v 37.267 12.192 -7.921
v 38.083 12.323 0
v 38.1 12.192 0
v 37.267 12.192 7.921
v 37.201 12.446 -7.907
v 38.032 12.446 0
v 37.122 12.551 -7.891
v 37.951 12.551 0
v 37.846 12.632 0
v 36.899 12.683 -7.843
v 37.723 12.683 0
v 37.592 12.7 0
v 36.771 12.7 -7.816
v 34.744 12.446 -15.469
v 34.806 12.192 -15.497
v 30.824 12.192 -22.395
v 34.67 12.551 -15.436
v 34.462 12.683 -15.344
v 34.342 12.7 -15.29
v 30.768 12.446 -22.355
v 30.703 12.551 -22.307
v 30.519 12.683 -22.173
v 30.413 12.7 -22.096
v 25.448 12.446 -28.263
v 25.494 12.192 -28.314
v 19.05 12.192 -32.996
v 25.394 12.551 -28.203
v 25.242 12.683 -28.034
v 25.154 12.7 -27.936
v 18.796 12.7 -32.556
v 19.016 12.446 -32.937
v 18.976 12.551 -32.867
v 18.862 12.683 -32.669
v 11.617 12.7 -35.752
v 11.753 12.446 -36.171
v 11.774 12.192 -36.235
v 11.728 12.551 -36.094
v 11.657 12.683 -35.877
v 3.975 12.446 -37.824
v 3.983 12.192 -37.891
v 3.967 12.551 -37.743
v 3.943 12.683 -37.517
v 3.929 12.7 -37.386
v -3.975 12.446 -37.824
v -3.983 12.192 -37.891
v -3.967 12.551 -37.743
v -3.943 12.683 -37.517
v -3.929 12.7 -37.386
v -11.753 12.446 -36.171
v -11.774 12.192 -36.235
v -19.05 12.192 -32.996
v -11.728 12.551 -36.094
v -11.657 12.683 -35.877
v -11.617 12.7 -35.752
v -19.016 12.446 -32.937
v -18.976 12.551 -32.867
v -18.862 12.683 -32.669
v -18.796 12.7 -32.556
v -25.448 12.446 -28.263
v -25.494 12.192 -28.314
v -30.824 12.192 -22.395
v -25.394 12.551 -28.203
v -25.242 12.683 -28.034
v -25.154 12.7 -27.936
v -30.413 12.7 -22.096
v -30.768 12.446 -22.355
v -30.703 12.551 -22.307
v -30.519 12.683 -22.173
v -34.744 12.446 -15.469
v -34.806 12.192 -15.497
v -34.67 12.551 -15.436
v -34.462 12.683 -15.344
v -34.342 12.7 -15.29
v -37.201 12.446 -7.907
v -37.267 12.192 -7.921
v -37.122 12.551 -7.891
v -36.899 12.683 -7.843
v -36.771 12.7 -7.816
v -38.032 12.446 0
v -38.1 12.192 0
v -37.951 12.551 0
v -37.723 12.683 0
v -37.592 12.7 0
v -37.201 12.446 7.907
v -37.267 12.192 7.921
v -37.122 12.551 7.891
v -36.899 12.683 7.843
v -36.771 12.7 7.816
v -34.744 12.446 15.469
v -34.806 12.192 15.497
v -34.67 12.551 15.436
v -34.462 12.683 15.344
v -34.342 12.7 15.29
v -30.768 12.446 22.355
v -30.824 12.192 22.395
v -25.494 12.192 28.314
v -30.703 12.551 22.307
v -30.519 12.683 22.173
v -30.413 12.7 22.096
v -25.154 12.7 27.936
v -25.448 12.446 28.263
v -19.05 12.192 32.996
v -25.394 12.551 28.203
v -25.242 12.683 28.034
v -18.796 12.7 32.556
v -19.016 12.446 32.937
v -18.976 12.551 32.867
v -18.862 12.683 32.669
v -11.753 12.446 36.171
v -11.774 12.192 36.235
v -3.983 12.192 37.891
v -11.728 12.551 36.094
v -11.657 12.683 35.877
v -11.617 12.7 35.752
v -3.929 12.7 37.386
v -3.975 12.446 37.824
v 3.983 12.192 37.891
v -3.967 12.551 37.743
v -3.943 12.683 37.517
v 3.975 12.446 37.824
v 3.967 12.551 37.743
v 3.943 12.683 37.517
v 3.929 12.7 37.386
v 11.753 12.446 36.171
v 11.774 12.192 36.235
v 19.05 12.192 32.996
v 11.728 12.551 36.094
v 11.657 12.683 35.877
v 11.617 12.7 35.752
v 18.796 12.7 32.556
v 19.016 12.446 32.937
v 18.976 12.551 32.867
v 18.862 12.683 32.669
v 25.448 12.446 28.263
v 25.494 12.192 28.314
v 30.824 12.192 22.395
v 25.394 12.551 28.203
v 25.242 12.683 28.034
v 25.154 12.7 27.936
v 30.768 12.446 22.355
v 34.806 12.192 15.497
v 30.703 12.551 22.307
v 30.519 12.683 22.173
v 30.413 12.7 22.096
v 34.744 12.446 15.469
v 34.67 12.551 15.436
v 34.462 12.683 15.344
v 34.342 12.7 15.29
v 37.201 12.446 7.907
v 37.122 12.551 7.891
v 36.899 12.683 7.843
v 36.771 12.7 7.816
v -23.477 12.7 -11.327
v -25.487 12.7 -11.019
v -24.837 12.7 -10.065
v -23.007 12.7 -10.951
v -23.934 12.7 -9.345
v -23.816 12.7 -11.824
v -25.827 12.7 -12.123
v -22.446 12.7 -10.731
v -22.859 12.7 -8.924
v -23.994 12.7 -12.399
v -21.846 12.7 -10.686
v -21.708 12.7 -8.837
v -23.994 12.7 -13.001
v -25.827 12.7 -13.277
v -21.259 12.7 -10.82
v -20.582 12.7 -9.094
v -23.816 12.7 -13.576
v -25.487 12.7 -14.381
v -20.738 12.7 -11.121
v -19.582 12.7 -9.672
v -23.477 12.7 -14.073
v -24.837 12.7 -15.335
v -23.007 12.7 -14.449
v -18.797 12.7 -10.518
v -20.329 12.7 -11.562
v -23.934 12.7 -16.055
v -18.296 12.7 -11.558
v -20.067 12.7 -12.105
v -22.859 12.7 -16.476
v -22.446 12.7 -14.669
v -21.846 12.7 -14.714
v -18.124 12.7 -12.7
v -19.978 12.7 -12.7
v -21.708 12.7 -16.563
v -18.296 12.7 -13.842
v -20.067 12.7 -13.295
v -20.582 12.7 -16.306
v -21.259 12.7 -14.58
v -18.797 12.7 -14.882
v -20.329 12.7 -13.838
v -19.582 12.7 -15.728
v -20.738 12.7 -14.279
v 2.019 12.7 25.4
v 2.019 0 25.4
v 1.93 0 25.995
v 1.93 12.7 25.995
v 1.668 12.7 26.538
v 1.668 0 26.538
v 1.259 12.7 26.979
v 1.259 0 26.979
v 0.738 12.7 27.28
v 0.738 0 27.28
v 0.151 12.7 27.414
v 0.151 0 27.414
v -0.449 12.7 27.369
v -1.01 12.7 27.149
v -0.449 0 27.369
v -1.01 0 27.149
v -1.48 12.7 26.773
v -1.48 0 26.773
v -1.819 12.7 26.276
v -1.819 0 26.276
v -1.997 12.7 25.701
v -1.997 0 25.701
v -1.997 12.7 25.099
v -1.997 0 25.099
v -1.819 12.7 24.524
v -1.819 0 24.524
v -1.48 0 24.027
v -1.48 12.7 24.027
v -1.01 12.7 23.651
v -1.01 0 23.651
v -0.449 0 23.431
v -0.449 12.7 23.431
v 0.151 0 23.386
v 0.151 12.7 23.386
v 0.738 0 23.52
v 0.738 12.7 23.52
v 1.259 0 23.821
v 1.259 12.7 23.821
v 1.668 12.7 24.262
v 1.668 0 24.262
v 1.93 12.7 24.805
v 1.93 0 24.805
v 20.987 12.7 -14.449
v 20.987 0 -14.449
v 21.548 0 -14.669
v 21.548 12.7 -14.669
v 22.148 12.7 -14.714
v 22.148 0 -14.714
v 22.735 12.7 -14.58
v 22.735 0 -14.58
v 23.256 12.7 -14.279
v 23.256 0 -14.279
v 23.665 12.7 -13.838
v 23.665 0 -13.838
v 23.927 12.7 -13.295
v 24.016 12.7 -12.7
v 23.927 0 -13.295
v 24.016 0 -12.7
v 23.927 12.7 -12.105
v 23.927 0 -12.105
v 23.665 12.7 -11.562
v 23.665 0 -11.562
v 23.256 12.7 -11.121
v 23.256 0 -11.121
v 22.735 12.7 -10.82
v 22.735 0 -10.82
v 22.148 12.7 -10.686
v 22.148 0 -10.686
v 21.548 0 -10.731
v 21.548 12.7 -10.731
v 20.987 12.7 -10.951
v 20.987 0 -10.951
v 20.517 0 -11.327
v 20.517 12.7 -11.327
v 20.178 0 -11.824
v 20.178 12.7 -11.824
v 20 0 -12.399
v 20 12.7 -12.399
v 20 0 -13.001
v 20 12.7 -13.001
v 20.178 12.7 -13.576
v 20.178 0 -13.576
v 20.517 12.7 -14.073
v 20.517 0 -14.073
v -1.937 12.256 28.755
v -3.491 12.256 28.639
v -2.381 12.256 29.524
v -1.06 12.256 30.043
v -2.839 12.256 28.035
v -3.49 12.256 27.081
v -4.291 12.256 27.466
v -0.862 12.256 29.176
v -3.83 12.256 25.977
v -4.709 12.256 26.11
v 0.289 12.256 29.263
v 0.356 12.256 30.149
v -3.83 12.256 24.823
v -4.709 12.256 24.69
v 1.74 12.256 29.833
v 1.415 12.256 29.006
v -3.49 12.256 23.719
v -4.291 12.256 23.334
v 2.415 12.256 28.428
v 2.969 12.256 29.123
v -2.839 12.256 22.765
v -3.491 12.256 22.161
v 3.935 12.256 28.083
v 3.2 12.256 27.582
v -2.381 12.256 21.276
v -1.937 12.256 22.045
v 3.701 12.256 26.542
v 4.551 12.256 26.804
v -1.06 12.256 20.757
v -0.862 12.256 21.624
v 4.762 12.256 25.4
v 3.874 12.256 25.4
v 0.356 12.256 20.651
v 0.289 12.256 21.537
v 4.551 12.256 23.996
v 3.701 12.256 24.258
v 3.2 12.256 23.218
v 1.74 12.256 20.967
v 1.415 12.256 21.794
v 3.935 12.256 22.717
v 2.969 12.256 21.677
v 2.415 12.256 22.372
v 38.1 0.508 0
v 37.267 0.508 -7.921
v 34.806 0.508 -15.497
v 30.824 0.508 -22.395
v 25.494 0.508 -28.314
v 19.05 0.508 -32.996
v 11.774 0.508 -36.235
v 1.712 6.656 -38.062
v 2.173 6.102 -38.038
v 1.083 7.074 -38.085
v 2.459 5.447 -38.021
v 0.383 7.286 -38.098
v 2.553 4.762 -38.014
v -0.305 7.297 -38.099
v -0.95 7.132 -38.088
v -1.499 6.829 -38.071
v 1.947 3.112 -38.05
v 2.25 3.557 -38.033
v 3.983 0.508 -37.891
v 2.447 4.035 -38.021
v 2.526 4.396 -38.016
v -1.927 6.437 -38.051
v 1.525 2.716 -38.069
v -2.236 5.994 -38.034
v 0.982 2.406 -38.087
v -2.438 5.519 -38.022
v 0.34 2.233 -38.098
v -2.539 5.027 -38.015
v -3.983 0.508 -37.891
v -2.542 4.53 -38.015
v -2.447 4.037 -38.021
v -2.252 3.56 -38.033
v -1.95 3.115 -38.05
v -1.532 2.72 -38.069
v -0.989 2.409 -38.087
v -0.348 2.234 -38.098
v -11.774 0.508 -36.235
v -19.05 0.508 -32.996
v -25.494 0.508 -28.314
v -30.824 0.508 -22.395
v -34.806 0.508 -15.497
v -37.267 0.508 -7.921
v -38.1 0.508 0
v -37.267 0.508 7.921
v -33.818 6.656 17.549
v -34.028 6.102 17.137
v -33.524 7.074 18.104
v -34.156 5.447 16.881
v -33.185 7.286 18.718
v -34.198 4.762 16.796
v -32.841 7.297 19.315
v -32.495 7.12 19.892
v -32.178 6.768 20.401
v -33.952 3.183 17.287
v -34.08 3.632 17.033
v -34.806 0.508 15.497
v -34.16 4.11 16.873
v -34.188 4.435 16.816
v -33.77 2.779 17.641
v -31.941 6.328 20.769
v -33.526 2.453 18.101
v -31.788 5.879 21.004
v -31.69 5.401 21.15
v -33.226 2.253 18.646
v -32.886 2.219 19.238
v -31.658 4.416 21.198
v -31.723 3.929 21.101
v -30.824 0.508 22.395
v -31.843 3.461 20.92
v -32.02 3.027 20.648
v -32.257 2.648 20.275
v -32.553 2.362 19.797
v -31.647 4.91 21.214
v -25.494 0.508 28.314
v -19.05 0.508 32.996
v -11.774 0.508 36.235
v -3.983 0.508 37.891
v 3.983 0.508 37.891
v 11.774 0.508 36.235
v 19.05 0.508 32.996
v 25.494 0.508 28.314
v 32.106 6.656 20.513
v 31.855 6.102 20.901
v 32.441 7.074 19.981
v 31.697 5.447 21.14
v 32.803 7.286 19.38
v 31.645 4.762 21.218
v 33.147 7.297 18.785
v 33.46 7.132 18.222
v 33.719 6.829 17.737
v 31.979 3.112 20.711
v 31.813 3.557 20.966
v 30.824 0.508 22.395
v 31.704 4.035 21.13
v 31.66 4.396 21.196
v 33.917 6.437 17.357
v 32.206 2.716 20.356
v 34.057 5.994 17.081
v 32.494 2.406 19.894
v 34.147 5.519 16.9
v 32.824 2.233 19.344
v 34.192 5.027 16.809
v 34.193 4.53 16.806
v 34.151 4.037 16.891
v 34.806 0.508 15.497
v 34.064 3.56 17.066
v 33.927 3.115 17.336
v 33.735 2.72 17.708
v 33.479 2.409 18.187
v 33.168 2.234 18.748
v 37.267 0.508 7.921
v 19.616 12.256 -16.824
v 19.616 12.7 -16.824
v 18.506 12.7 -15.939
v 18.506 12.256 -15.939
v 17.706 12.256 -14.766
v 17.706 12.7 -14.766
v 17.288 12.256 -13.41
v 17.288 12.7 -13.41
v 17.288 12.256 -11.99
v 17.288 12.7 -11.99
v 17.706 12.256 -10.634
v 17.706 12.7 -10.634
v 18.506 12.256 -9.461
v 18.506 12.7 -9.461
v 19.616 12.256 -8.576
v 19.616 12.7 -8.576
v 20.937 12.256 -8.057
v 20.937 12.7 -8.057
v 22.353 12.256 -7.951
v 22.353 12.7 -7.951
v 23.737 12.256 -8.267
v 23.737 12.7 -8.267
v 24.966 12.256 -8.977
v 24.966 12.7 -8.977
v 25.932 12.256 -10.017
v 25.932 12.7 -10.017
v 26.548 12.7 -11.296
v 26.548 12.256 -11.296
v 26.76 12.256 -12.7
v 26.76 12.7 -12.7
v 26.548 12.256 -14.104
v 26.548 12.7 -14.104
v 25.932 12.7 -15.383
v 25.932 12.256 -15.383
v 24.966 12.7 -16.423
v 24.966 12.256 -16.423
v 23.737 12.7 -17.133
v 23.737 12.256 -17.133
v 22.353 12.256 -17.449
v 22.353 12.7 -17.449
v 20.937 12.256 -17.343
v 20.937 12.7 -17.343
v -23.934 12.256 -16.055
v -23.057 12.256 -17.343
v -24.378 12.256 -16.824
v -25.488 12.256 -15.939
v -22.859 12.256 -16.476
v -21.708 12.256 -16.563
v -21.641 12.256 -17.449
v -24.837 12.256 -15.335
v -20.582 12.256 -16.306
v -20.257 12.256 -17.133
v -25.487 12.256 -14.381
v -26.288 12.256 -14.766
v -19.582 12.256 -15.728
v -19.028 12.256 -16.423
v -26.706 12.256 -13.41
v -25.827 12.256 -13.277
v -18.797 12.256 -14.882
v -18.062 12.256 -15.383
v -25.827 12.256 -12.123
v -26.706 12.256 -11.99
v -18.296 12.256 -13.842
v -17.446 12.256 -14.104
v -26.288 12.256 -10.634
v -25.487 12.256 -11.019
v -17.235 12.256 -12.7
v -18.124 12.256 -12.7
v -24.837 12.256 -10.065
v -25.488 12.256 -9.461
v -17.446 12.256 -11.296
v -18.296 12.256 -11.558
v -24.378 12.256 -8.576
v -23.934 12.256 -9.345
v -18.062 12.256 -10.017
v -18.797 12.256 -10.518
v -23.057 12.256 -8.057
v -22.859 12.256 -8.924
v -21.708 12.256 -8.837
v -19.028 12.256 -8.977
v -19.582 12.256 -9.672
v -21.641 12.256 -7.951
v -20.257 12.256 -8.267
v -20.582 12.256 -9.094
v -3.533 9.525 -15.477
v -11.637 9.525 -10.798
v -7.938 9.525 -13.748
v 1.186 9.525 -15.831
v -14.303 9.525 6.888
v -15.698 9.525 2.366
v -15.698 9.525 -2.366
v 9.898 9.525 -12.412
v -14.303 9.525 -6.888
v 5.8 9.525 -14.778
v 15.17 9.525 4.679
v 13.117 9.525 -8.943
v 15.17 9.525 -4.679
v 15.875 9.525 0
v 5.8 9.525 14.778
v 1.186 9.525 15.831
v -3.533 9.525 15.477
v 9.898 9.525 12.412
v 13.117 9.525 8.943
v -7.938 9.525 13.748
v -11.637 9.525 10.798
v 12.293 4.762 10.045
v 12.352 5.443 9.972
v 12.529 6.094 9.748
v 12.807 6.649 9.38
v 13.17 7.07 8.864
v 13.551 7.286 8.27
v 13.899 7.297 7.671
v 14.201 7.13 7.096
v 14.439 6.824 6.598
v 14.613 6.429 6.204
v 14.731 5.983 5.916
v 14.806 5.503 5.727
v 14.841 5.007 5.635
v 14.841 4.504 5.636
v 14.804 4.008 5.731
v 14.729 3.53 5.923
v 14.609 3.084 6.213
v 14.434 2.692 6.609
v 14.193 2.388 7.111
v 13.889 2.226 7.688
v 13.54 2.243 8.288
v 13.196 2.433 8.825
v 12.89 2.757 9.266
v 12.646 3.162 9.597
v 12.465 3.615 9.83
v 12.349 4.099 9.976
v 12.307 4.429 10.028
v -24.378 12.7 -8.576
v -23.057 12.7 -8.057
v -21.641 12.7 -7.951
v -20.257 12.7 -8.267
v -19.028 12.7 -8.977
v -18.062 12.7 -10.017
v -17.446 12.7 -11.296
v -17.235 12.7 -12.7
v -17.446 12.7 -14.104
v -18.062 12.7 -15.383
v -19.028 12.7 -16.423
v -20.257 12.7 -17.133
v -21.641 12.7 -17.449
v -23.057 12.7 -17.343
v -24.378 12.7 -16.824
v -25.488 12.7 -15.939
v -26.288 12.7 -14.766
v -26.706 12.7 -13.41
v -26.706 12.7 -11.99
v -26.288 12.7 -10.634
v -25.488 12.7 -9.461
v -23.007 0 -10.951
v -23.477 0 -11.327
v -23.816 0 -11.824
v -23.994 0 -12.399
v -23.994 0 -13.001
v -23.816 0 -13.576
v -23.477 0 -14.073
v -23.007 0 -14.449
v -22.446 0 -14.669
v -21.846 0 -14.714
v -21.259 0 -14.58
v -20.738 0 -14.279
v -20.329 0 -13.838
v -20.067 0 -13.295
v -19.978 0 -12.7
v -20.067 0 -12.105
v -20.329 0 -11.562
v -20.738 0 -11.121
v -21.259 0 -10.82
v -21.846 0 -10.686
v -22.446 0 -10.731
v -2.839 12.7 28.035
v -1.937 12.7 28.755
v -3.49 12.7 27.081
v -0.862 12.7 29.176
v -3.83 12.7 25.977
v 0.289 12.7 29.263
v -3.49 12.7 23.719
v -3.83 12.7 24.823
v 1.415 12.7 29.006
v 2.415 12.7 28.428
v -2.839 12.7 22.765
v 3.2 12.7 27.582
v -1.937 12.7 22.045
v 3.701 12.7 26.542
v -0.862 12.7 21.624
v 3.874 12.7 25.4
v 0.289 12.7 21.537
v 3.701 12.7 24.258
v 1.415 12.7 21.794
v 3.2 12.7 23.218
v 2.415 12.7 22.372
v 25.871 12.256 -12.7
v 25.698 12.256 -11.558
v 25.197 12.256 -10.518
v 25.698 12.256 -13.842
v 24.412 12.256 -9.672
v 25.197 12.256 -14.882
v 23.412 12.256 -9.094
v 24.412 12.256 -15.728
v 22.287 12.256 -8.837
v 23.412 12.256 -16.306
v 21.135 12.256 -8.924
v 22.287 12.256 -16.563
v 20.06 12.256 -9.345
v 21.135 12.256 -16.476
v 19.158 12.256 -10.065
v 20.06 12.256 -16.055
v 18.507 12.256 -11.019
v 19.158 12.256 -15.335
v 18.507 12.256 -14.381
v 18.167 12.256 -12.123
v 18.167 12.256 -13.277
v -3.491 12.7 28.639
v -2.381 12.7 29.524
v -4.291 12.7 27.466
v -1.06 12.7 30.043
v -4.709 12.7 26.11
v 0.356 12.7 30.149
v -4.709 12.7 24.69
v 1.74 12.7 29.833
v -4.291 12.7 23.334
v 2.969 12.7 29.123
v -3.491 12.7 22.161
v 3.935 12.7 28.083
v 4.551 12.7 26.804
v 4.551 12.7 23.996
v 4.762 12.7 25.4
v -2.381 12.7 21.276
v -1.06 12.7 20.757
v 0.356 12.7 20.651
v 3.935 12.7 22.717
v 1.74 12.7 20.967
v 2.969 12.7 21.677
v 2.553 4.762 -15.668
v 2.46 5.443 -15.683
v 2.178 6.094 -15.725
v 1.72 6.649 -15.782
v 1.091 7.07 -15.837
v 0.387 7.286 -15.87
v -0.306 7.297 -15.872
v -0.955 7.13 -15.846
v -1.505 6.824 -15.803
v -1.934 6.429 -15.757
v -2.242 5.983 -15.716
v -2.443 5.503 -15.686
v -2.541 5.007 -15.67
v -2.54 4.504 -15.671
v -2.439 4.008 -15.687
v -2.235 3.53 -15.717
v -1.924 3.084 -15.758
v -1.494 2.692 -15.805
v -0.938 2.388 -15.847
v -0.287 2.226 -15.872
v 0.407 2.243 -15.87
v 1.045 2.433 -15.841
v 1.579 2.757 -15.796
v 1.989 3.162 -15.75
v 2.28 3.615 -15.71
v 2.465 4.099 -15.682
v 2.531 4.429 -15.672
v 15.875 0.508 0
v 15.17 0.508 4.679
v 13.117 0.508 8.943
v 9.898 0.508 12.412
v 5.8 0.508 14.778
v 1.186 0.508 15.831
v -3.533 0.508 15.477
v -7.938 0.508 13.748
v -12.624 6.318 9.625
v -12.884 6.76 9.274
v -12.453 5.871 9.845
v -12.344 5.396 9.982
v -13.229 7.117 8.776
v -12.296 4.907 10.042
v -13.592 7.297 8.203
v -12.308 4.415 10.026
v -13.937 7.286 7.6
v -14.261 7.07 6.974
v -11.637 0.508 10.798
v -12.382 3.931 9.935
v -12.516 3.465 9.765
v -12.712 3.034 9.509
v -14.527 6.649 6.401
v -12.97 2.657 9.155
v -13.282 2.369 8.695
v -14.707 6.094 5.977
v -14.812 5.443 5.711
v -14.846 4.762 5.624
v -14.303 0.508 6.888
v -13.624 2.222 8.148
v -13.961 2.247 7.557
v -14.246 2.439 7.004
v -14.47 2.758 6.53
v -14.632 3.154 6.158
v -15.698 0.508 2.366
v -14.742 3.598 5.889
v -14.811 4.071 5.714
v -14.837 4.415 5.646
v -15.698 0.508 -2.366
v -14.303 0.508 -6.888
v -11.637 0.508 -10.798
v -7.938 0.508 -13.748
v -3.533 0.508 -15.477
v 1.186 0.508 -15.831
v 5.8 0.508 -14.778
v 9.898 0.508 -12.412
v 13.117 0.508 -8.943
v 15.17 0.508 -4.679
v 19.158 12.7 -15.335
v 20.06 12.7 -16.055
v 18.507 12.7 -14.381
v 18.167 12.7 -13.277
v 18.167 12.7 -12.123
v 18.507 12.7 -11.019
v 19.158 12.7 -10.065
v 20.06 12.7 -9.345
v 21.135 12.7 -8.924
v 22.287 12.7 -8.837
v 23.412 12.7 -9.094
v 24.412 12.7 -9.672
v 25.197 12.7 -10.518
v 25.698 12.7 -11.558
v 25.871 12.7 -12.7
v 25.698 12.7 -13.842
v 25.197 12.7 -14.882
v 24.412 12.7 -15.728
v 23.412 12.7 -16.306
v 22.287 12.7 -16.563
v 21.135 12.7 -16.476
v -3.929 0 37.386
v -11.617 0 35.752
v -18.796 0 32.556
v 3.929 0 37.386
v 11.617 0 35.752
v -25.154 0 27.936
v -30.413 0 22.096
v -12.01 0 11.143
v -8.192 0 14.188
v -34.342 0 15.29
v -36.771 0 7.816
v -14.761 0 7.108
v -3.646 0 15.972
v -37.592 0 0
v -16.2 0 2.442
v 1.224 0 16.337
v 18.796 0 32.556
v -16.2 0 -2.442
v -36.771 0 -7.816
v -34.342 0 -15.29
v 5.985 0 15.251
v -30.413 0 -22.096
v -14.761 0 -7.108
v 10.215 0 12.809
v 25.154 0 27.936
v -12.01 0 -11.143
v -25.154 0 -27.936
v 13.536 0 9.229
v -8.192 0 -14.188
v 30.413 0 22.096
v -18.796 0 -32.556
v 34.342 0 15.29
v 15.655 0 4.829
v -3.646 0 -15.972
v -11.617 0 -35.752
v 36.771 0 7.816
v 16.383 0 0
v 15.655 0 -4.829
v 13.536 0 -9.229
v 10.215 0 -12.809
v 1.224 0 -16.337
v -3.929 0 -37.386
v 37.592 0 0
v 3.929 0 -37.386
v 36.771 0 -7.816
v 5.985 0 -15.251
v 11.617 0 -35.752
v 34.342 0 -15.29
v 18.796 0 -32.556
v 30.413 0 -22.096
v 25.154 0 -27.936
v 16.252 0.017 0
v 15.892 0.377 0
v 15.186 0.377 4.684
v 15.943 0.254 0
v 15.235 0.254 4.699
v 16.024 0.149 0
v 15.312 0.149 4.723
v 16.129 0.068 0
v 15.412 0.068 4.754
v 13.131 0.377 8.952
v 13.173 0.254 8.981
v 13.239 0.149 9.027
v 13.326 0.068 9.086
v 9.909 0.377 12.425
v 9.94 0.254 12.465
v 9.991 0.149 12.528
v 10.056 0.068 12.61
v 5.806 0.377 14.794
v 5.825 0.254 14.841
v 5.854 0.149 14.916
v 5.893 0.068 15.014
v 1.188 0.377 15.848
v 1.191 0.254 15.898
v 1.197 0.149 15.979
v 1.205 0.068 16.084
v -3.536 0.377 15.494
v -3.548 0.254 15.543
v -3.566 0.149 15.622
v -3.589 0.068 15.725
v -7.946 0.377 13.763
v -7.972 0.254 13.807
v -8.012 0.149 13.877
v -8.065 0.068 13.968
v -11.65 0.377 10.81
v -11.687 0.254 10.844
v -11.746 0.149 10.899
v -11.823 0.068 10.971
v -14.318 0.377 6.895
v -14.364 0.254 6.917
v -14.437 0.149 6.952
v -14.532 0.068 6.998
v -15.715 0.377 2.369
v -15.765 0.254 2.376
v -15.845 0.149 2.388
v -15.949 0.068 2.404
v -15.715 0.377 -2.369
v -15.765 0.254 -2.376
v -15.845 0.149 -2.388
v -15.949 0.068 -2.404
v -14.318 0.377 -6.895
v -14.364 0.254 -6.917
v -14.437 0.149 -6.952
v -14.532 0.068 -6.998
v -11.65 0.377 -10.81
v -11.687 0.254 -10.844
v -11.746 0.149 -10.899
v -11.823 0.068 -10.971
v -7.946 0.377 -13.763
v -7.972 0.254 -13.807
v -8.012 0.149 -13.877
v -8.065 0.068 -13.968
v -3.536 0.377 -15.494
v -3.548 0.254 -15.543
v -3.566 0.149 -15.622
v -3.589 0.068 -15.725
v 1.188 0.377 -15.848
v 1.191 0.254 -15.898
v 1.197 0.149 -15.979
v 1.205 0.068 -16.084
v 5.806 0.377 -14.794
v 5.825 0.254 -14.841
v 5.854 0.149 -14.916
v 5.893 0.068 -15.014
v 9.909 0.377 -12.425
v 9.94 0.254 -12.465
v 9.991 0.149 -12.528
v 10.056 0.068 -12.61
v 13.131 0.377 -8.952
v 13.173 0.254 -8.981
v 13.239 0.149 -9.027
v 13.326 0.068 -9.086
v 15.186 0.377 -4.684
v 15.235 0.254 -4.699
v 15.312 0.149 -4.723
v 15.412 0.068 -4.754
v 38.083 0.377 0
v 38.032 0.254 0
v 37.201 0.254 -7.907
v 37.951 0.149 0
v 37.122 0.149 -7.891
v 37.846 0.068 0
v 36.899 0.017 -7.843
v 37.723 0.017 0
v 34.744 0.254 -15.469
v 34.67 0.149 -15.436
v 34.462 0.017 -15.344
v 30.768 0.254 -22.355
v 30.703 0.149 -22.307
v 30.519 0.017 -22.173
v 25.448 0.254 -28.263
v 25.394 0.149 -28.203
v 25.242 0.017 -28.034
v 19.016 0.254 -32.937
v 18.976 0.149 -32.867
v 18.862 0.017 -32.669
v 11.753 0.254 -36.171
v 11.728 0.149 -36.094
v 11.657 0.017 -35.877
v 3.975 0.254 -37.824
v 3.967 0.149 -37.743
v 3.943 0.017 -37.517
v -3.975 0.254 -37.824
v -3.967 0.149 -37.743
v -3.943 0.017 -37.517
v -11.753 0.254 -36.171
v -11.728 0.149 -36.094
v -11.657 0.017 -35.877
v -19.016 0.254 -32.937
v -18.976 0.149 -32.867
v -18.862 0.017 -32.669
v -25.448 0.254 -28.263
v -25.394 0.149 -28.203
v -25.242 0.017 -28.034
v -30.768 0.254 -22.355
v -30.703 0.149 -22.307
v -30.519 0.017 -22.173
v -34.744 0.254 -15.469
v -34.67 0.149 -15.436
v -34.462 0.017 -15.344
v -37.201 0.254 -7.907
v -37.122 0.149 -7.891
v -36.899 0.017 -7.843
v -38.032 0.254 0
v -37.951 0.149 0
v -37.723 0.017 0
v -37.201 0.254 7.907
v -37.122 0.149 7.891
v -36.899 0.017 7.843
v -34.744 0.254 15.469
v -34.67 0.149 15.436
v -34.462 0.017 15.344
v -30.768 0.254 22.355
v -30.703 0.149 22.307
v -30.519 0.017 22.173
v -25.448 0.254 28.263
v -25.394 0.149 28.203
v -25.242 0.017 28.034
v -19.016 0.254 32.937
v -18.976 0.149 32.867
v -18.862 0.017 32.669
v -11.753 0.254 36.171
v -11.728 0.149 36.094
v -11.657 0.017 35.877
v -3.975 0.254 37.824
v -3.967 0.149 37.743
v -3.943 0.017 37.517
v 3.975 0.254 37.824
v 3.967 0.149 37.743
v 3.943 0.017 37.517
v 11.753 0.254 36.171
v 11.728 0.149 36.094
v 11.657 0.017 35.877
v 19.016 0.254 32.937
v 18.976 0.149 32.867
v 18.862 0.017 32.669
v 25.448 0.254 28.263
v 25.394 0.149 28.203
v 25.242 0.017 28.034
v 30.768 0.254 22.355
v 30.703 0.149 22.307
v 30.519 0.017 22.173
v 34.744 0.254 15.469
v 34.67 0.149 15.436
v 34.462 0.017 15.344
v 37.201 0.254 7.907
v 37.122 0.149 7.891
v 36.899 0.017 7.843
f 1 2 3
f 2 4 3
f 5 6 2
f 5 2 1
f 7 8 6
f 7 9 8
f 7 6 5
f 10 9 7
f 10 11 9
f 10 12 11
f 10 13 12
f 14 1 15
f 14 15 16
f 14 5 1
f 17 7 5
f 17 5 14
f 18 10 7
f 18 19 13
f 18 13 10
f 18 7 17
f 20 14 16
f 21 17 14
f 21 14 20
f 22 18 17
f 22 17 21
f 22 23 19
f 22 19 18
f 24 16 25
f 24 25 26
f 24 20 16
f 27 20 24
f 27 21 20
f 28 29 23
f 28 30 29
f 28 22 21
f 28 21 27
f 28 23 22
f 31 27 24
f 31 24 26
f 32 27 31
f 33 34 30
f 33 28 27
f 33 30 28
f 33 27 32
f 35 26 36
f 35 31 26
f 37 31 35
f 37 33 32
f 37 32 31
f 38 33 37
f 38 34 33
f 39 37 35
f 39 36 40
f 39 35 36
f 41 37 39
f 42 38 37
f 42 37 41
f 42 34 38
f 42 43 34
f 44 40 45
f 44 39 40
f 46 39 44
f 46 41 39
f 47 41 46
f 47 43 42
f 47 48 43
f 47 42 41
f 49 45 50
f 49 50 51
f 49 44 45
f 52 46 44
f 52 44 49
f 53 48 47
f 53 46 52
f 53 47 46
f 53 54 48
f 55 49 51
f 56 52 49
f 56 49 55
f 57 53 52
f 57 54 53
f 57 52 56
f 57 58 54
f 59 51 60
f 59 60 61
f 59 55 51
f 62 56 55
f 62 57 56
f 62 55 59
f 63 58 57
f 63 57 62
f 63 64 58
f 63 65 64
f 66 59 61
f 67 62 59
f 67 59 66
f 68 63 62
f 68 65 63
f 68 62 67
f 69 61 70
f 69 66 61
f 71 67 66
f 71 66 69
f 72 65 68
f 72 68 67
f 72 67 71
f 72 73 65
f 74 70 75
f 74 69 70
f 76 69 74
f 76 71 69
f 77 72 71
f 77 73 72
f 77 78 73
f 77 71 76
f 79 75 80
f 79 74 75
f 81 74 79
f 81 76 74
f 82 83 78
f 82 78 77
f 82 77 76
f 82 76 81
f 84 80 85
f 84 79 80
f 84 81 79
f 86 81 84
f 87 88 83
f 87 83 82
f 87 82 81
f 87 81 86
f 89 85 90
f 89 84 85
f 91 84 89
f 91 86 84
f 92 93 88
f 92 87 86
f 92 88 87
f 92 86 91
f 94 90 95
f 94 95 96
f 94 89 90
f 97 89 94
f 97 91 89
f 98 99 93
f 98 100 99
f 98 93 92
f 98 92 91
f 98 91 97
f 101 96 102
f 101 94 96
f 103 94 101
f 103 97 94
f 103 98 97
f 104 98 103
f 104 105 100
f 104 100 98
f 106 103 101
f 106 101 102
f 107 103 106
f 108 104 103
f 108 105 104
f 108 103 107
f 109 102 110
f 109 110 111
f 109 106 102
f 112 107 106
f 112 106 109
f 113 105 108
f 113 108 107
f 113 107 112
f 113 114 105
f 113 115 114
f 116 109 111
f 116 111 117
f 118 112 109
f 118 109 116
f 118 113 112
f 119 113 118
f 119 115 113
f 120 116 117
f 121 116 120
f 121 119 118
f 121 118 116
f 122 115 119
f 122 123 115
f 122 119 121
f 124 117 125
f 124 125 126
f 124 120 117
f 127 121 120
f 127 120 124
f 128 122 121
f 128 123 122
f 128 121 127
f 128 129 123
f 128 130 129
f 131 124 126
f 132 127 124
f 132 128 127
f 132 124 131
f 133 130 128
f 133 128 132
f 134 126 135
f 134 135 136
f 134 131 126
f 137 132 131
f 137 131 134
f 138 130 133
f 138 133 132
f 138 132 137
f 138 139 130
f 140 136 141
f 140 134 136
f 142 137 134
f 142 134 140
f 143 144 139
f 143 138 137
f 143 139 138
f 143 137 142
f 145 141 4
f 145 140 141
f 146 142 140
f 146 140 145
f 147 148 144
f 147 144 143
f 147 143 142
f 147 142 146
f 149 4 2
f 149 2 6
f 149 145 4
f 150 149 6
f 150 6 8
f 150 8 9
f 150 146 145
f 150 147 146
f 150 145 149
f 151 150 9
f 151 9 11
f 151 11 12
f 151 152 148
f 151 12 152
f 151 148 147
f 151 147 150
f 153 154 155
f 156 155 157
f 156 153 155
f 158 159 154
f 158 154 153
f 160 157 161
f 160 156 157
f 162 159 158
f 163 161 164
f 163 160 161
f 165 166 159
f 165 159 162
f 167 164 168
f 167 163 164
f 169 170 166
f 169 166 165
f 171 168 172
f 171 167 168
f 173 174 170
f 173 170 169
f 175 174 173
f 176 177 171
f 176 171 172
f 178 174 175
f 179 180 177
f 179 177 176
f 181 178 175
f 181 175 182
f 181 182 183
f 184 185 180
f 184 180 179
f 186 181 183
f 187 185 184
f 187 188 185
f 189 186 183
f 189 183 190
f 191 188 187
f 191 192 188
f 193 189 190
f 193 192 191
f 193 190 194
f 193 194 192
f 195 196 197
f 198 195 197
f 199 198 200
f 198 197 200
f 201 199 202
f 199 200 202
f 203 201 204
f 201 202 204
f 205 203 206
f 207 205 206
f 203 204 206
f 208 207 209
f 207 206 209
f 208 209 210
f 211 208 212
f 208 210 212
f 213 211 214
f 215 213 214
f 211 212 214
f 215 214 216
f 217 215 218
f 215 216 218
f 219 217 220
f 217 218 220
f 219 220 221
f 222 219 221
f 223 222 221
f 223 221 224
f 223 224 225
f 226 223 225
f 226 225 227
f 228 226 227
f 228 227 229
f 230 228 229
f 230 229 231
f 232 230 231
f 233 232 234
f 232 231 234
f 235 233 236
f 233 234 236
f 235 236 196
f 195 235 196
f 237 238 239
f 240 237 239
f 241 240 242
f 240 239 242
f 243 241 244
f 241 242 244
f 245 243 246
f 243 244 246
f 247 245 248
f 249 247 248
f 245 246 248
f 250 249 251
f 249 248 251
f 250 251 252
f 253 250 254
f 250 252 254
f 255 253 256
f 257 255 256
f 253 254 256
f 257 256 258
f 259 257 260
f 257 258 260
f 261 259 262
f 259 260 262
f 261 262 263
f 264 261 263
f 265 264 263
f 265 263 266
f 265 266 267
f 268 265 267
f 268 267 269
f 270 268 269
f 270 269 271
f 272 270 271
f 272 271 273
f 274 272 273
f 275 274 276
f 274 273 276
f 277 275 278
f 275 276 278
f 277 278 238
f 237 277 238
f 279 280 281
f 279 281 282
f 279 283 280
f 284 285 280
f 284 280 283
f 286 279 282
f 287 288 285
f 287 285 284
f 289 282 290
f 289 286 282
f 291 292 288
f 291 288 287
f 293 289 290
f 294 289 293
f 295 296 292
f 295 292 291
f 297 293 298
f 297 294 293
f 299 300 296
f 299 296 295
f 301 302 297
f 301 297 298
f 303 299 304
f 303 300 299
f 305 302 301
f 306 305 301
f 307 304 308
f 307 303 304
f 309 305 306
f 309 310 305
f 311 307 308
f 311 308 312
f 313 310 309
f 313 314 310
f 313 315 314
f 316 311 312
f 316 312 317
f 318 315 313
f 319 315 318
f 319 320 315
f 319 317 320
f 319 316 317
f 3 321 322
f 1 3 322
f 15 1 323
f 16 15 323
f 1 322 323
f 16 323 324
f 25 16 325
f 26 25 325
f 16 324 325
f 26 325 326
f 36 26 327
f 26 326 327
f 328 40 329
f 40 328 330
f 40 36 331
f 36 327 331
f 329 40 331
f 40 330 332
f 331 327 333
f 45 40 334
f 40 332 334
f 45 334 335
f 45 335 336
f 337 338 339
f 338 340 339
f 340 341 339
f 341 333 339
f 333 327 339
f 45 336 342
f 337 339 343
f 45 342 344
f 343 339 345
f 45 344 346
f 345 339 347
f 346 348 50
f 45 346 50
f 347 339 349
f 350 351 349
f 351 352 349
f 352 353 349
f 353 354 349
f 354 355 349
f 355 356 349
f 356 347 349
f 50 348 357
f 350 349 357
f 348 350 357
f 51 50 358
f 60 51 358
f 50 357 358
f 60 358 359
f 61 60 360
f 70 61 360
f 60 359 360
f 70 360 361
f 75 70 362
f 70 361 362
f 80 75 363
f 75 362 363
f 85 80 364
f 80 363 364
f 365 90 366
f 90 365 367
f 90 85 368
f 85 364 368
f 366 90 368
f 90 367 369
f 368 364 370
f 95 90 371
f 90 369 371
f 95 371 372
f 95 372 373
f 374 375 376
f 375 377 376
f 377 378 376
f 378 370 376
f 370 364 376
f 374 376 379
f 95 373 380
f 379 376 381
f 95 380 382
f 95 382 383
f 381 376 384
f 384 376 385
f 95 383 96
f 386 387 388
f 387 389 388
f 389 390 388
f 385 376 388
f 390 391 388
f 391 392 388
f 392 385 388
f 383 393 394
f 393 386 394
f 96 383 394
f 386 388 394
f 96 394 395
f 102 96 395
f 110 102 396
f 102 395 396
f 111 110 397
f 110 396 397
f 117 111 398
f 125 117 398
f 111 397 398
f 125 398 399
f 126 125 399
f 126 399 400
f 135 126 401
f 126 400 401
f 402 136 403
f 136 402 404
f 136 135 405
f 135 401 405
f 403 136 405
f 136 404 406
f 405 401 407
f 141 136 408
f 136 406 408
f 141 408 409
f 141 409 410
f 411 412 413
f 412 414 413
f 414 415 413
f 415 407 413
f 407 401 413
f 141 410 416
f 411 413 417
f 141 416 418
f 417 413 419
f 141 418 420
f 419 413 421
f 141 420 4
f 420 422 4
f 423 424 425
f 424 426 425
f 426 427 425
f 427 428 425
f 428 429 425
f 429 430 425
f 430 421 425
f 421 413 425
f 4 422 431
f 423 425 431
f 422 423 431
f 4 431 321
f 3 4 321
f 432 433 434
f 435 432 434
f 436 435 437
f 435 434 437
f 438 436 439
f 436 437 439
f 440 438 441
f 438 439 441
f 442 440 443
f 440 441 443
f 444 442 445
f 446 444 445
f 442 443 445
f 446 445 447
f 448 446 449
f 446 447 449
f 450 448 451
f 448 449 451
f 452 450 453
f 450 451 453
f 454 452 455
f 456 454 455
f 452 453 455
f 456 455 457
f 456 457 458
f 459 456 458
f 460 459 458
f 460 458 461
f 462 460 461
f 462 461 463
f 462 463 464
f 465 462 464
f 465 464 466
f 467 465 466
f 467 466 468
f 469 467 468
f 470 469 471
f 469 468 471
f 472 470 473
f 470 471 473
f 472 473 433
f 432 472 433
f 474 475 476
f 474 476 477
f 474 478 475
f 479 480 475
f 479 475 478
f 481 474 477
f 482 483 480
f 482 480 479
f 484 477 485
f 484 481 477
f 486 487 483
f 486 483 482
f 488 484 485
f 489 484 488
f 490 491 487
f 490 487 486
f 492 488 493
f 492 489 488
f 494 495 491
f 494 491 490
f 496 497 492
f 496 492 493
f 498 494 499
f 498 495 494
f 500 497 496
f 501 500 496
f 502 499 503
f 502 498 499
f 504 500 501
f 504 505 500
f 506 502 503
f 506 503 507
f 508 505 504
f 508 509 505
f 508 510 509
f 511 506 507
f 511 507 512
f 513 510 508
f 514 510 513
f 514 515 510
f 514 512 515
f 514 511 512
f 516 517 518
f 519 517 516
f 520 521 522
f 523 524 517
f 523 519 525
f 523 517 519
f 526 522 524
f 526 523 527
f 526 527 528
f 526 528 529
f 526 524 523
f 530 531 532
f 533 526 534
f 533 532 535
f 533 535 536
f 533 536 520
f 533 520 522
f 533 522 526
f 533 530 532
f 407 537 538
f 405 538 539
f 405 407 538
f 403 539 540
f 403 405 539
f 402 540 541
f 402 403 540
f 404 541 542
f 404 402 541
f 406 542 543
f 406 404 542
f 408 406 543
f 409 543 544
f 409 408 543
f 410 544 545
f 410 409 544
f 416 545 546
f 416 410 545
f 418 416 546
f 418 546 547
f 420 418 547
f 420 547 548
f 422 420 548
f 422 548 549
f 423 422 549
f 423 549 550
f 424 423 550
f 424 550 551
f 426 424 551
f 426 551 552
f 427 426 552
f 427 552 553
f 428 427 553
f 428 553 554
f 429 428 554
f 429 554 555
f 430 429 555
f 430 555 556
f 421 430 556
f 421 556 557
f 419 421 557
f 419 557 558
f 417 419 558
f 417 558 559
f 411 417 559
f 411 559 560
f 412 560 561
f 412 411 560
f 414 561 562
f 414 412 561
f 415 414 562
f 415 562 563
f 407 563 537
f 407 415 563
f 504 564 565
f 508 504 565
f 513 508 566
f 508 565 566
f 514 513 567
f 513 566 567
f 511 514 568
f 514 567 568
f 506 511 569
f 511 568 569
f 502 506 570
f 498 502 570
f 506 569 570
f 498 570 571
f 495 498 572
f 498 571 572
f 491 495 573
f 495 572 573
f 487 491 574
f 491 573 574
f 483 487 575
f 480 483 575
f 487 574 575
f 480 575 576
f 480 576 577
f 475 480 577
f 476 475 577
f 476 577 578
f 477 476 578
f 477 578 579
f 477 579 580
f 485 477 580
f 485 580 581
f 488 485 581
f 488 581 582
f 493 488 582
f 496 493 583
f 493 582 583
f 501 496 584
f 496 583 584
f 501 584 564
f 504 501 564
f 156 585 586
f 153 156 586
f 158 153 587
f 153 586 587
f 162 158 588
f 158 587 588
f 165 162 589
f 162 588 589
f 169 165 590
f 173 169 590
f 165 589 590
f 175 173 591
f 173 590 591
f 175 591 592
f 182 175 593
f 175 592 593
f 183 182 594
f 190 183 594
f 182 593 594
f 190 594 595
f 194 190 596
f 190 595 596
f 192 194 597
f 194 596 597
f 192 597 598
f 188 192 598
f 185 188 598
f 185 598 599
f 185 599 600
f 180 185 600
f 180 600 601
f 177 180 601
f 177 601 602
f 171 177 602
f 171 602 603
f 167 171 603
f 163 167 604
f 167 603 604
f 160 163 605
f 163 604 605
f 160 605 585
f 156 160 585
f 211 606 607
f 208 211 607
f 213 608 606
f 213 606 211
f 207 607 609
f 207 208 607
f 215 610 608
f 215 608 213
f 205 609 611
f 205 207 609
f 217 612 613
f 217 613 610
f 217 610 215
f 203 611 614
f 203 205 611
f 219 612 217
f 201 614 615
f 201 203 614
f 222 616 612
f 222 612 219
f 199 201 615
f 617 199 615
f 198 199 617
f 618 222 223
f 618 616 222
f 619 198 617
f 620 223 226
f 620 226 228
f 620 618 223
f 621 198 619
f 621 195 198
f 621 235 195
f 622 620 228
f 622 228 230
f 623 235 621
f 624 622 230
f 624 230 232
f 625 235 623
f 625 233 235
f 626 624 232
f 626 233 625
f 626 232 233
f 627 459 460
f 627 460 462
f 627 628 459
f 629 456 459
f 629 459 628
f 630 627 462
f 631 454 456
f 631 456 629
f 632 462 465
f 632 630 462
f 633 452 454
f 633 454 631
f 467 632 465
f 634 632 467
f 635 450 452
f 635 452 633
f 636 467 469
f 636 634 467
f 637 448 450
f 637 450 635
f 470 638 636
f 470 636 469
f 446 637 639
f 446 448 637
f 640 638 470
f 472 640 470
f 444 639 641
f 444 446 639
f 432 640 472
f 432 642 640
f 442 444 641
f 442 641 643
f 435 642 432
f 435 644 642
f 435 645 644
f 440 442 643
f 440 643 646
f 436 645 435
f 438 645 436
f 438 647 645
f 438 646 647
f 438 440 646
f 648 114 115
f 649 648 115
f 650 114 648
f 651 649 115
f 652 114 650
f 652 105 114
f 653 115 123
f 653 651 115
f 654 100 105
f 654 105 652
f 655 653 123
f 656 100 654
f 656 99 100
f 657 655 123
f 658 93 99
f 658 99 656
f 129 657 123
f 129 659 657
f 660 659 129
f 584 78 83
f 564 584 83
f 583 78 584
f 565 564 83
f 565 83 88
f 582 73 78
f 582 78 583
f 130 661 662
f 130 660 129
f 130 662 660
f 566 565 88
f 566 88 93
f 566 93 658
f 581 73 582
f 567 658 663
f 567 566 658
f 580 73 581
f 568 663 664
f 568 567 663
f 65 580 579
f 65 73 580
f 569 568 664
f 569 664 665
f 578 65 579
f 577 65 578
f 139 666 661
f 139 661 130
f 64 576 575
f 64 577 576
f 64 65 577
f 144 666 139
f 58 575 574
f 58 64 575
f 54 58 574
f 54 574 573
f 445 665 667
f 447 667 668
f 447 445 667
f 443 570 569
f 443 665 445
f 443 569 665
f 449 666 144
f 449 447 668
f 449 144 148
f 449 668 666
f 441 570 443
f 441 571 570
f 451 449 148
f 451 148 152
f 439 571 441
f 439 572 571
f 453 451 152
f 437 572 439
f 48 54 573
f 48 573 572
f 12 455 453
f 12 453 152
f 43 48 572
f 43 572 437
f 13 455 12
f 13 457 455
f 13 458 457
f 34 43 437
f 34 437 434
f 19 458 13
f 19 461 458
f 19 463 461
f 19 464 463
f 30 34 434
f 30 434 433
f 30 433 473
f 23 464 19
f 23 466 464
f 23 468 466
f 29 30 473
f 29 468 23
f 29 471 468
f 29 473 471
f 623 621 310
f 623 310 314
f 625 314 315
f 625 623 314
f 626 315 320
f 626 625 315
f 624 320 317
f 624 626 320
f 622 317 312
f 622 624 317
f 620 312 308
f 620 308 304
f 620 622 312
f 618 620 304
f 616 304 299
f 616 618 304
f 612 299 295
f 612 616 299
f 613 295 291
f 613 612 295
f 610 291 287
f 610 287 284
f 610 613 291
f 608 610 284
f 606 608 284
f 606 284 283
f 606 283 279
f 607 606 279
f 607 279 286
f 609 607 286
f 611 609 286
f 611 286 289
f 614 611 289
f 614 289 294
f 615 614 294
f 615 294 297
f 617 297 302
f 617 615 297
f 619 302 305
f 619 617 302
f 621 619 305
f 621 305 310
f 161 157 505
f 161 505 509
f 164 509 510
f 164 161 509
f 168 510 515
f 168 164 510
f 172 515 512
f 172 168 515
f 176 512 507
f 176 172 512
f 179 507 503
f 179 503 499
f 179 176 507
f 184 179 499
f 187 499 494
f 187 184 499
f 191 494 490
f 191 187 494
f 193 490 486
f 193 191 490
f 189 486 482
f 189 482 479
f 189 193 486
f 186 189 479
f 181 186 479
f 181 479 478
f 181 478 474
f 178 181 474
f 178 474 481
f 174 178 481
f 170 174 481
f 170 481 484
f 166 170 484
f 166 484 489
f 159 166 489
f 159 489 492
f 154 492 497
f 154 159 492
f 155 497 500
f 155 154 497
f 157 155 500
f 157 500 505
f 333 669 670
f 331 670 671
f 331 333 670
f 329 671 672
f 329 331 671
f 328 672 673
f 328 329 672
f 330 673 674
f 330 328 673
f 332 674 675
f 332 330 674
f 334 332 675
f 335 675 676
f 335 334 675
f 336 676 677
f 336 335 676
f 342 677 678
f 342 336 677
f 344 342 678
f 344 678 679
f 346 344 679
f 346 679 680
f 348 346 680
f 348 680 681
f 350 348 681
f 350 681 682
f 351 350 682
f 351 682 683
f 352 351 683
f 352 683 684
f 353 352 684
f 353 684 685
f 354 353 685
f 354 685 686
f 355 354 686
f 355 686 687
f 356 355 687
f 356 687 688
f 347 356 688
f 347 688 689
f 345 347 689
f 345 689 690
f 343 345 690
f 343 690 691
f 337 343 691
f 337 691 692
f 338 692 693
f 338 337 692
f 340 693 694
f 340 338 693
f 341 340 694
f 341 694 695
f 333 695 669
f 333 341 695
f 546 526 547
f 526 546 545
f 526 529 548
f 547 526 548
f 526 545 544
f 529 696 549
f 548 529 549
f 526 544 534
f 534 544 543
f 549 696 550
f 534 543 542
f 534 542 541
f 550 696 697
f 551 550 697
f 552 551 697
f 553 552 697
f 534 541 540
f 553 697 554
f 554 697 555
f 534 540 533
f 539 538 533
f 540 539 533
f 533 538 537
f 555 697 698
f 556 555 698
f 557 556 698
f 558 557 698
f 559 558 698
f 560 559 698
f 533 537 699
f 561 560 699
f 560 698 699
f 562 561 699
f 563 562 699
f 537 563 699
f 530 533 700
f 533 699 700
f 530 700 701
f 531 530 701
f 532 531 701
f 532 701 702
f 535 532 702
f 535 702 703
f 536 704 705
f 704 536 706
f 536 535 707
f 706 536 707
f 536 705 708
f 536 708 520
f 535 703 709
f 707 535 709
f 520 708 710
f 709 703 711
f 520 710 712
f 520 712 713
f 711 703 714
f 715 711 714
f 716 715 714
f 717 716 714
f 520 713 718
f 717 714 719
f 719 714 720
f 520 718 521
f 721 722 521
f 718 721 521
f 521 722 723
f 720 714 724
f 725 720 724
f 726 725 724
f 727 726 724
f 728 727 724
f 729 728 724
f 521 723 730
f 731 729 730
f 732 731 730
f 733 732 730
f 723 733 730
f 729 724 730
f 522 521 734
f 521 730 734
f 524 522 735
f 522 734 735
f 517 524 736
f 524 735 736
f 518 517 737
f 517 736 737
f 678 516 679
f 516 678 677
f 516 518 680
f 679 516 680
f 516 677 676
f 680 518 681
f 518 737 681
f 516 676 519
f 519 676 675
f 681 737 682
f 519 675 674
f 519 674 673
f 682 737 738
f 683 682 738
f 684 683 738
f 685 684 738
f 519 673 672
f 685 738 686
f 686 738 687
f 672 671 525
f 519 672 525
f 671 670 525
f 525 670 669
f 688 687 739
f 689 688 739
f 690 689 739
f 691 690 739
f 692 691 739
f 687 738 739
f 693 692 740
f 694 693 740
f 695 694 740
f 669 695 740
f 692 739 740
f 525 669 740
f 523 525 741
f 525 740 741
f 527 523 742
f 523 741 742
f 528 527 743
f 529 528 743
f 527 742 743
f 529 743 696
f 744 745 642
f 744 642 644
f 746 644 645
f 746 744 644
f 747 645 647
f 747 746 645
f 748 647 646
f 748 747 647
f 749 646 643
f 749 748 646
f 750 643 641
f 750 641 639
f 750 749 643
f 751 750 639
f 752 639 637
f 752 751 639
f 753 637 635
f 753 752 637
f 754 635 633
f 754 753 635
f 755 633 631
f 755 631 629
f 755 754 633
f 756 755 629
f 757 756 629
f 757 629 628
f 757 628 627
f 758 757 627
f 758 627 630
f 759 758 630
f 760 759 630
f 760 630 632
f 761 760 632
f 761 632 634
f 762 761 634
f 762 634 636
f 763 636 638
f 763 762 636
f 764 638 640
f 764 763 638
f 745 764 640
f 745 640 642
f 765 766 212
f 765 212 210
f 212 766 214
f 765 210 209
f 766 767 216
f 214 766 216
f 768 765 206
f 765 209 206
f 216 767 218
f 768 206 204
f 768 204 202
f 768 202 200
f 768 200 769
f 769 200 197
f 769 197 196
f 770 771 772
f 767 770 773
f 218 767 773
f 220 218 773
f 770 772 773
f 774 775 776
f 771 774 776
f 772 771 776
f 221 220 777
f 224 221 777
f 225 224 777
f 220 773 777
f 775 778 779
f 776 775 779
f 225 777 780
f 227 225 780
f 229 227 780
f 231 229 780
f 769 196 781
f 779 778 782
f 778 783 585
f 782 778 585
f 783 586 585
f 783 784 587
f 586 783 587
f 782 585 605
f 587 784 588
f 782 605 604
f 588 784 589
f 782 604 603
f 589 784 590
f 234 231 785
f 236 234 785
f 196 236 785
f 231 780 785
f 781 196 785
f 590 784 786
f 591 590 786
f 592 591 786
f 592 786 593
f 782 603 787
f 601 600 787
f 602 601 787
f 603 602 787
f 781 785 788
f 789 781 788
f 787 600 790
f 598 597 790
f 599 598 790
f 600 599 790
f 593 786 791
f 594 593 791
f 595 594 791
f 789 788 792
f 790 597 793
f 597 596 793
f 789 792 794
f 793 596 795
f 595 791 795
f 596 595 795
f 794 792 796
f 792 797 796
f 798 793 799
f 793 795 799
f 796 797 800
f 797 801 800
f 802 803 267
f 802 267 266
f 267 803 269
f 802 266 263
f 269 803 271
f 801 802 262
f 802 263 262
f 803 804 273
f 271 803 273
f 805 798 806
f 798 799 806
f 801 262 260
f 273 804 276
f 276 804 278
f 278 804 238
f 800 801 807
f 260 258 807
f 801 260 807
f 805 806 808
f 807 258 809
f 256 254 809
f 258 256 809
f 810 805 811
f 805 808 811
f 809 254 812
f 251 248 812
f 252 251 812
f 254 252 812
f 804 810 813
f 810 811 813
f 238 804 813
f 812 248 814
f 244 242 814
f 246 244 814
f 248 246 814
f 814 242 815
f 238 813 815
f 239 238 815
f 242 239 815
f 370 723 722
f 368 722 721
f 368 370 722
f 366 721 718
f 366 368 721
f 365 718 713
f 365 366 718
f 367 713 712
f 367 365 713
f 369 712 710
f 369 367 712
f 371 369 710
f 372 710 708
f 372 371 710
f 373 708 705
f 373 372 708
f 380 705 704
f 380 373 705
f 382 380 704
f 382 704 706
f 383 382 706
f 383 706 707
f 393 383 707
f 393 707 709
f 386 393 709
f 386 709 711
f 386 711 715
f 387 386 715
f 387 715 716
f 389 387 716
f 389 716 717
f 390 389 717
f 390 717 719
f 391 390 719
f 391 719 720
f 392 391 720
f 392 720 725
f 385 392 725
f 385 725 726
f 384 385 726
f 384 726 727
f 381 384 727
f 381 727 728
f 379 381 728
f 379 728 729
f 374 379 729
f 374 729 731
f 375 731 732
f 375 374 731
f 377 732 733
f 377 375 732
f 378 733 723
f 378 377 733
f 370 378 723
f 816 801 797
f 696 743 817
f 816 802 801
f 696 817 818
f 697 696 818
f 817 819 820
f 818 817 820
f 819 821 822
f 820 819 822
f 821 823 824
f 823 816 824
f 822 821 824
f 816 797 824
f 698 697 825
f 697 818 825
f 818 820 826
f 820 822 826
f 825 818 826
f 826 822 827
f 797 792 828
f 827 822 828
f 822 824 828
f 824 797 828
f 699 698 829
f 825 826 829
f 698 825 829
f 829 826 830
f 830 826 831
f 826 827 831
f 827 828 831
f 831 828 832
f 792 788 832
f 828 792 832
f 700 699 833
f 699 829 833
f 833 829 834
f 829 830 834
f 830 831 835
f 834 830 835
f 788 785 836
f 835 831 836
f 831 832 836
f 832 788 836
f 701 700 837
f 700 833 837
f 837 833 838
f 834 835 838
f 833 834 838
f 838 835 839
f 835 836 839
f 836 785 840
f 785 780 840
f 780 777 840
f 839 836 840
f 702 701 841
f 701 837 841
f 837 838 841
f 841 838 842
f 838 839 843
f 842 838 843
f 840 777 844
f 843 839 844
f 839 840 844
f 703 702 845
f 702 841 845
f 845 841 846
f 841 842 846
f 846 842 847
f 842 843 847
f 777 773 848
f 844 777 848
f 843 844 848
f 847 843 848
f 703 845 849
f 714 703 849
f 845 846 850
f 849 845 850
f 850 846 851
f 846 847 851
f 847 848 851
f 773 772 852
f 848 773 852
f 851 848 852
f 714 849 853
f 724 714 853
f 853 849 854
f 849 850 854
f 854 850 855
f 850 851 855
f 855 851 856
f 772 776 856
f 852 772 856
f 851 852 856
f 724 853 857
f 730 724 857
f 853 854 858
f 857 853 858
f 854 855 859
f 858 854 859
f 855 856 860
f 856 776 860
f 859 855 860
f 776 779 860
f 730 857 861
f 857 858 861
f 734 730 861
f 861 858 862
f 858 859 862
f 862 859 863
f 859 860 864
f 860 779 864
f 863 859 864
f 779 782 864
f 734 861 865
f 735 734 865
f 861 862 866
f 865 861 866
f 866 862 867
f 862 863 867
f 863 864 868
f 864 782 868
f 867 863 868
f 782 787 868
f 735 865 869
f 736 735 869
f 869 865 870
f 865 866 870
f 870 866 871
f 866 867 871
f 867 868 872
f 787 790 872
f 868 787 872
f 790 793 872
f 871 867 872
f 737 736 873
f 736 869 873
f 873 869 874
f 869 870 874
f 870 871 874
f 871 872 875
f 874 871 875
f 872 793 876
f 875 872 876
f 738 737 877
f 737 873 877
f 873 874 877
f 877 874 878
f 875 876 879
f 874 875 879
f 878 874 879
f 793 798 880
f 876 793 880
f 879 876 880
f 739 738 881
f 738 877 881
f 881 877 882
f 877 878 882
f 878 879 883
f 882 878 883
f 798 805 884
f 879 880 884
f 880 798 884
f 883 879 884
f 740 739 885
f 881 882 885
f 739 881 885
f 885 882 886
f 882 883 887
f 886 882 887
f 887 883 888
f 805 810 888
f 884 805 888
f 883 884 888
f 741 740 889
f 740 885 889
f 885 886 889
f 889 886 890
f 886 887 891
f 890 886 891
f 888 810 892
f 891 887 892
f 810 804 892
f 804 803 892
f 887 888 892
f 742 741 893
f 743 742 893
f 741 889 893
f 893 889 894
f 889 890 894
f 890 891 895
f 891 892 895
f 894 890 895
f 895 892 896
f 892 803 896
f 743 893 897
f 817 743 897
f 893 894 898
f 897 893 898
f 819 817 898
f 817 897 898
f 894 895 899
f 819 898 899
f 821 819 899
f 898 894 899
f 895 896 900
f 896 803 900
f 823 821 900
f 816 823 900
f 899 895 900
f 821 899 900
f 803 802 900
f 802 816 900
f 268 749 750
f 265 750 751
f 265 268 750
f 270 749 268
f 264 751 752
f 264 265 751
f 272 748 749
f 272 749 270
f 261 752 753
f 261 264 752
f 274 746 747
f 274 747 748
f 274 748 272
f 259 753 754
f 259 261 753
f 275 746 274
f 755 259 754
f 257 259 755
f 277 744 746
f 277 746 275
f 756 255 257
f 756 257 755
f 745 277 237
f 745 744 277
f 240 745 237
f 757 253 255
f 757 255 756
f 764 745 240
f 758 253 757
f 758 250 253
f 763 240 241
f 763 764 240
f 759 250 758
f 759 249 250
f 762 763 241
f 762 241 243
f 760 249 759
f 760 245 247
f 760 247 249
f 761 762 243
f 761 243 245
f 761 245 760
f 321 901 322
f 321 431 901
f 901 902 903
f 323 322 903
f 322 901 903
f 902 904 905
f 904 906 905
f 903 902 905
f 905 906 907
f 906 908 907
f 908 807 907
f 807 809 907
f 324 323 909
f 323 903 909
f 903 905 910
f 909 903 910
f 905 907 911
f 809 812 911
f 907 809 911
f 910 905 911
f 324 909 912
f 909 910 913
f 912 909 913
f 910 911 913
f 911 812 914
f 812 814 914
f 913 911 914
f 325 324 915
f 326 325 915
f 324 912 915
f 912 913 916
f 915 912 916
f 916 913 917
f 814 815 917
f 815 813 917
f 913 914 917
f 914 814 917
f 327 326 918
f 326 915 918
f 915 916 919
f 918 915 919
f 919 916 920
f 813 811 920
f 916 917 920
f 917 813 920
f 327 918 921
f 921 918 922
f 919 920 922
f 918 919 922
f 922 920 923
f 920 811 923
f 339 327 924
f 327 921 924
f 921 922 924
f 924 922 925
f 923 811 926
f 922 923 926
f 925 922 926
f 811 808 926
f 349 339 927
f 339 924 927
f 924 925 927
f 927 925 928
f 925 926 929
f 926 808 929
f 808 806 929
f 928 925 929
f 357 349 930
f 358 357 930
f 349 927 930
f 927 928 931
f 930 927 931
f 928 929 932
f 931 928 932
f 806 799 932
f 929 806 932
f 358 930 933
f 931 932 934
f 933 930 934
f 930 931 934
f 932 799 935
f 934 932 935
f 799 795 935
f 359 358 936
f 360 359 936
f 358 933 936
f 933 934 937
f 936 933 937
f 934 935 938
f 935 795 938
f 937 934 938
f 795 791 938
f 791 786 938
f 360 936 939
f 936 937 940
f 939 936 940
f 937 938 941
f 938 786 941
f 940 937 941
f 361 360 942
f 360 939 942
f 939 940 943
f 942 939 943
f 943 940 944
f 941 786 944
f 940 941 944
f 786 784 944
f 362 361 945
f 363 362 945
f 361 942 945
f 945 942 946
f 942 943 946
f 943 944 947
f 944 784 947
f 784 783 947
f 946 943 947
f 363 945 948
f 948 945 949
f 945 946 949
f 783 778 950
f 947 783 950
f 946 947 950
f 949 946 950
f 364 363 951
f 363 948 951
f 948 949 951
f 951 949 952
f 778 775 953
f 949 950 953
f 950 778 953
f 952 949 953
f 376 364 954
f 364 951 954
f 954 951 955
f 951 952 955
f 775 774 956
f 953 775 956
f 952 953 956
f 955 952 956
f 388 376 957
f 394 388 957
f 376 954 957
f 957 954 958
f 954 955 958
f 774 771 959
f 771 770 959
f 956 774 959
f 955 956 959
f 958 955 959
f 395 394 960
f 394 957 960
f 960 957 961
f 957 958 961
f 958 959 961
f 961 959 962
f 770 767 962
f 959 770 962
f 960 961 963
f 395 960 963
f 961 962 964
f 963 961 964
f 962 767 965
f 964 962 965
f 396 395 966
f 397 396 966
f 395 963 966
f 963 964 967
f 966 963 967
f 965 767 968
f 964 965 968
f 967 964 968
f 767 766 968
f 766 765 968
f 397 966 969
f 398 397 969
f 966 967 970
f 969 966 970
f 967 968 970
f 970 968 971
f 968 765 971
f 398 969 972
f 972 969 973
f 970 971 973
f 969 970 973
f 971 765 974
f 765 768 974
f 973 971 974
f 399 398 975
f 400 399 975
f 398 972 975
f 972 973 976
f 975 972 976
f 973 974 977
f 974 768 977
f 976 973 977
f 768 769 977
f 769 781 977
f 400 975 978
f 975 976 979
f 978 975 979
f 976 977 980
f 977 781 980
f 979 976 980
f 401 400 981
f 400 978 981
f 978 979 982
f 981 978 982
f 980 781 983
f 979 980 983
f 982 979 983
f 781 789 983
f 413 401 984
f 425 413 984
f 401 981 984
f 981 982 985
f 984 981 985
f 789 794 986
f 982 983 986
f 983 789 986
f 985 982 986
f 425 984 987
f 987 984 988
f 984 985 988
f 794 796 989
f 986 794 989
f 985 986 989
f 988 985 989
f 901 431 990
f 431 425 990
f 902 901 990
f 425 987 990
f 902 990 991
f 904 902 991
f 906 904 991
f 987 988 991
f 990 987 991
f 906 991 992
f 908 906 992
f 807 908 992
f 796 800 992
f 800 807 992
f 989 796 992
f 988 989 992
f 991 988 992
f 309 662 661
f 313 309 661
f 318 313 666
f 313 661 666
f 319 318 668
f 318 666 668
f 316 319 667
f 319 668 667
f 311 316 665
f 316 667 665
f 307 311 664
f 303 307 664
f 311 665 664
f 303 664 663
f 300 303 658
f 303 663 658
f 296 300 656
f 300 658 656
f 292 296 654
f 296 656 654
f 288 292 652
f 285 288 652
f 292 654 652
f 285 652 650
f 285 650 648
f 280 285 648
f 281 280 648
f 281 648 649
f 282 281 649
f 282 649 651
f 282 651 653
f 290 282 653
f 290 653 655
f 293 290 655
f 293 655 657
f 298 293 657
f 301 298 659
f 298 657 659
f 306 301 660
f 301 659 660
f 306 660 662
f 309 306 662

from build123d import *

# Parameters (mm, degrees)
SKETCH1_R           = 38.1
BOSS_EXTRUDE1_DEPTH = 12.7
SKETCH2_R           = 15.875
CUT_EXTRUDE1_DEPTH  = 9.525
SKETCH3_R           = 2.0193
CUT_EXTRUDE2_DEPTH  = 12.7
CIRPATTERN1_COUNT   = 3
CUT_EXTRUDE3_START  = -38.1
SKETCH4_R           = 2.5527
CUT_EXTRUDE3_DEPTH  = 22.431581
CIRPATTERN2_COUNT   = 3
FILLET1_R           = 0.508
SKETCH5_R           = 4.7625
SKETCH5_R_2         = 3.8735
CUT_EXTRUDE4_DEPTH  = 0.4445
CIRPATTERN3_COUNT   = 3


with BuildPart() as part:
    # Sketch1 → Boss-Extrude1 (new body)
    with BuildSketch(Plane(origin=(0, 0, 0), x_dir=(1, 0, 0), z_dir=(0, 1, 0))):
        Circle(SKETCH1_R)
    extrude(amount=BOSS_EXTRUDE1_DEPTH)

    # Sketch2 → Cut-Extrude1 (cut)
    with BuildSketch(Plane.XZ):
        Circle(SKETCH2_R)
    extrude(amount=-CUT_EXTRUDE1_DEPTH, mode=Mode.SUBTRACT)

    # Sketch3 → Cut-Extrude2 (cut)
    with BuildSketch(Plane.XZ):
        with Locations((0, 25.4)):
            Circle(SKETCH3_R)
    cut_extrude2 = extrude(amount=-CUT_EXTRUDE2_DEPTH, mode=Mode.SUBTRACT)

    # CirPattern1: Cut-Extrude2 ×3 about axis
    cirpattern1_axis = Axis((0, 0, 0), (0, 1, 0))
    for i in range(1, CIRPATTERN1_COUNT):
        add(cut_extrude2.rotate(cirpattern1_axis, i * 360 / CIRPATTERN1_COUNT), mode=Mode.SUBTRACT)

    # Sketch4 → Cut-Extrude3 (cut)
    with BuildSketch(Plane.XY.offset(CUT_EXTRUDE3_START)):
        with Locations((0, 4.7625)):
            Circle(SKETCH4_R)
    cut_extrude3 = extrude(amount=CUT_EXTRUDE3_DEPTH, mode=Mode.SUBTRACT)

    # CirPattern2: Cut-Extrude3 ×3 about axis
    cirpattern2_axis = Axis((0, 0, 0), (0, 1, 0))
    for i in range(1, CIRPATTERN2_COUNT):
        add(cut_extrude3.rotate(cirpattern2_axis, i * 360 / CIRPATTERN2_COUNT), mode=Mode.SUBTRACT)

    # Fillet1
    fillet1_edges = [part.edges().sort_by_distance(p)[0] for p in [
        (-38.1, 0, 0),
        (-38.1, 12.7, 0),
        (-15.875, 0, 0),
    ]]
    fillet(fillet1_edges, radius=FILLET1_R)

    # Sketch5 → Cut-Extrude4 (cut)
    with BuildSketch(Plane(origin=(0, 12.7, 0), x_dir=(1, 0, 0), z_dir=(0, 1, 0))):
        with Locations((0, -25.4)):
            Circle(SKETCH5_R)
        with Locations((0, -25.4)):
            Circle(SKETCH5_R_2, mode=Mode.SUBTRACT)
    cut_extrude4 = extrude(amount=-CUT_EXTRUDE4_DEPTH, mode=Mode.SUBTRACT)

    # CirPattern3: Cut-Extrude4 ×3 about axis
    cirpattern3_axis = Axis((0, 0, 0), (0, 1, 0))
    for i in range(1, CIRPATTERN3_COUNT):
        add(cut_extrude4.rotate(cirpattern3_axis, i * 360 / CIRPATTERN3_COUNT), mode=Mode.SUBTRACT)


solid = part.part
